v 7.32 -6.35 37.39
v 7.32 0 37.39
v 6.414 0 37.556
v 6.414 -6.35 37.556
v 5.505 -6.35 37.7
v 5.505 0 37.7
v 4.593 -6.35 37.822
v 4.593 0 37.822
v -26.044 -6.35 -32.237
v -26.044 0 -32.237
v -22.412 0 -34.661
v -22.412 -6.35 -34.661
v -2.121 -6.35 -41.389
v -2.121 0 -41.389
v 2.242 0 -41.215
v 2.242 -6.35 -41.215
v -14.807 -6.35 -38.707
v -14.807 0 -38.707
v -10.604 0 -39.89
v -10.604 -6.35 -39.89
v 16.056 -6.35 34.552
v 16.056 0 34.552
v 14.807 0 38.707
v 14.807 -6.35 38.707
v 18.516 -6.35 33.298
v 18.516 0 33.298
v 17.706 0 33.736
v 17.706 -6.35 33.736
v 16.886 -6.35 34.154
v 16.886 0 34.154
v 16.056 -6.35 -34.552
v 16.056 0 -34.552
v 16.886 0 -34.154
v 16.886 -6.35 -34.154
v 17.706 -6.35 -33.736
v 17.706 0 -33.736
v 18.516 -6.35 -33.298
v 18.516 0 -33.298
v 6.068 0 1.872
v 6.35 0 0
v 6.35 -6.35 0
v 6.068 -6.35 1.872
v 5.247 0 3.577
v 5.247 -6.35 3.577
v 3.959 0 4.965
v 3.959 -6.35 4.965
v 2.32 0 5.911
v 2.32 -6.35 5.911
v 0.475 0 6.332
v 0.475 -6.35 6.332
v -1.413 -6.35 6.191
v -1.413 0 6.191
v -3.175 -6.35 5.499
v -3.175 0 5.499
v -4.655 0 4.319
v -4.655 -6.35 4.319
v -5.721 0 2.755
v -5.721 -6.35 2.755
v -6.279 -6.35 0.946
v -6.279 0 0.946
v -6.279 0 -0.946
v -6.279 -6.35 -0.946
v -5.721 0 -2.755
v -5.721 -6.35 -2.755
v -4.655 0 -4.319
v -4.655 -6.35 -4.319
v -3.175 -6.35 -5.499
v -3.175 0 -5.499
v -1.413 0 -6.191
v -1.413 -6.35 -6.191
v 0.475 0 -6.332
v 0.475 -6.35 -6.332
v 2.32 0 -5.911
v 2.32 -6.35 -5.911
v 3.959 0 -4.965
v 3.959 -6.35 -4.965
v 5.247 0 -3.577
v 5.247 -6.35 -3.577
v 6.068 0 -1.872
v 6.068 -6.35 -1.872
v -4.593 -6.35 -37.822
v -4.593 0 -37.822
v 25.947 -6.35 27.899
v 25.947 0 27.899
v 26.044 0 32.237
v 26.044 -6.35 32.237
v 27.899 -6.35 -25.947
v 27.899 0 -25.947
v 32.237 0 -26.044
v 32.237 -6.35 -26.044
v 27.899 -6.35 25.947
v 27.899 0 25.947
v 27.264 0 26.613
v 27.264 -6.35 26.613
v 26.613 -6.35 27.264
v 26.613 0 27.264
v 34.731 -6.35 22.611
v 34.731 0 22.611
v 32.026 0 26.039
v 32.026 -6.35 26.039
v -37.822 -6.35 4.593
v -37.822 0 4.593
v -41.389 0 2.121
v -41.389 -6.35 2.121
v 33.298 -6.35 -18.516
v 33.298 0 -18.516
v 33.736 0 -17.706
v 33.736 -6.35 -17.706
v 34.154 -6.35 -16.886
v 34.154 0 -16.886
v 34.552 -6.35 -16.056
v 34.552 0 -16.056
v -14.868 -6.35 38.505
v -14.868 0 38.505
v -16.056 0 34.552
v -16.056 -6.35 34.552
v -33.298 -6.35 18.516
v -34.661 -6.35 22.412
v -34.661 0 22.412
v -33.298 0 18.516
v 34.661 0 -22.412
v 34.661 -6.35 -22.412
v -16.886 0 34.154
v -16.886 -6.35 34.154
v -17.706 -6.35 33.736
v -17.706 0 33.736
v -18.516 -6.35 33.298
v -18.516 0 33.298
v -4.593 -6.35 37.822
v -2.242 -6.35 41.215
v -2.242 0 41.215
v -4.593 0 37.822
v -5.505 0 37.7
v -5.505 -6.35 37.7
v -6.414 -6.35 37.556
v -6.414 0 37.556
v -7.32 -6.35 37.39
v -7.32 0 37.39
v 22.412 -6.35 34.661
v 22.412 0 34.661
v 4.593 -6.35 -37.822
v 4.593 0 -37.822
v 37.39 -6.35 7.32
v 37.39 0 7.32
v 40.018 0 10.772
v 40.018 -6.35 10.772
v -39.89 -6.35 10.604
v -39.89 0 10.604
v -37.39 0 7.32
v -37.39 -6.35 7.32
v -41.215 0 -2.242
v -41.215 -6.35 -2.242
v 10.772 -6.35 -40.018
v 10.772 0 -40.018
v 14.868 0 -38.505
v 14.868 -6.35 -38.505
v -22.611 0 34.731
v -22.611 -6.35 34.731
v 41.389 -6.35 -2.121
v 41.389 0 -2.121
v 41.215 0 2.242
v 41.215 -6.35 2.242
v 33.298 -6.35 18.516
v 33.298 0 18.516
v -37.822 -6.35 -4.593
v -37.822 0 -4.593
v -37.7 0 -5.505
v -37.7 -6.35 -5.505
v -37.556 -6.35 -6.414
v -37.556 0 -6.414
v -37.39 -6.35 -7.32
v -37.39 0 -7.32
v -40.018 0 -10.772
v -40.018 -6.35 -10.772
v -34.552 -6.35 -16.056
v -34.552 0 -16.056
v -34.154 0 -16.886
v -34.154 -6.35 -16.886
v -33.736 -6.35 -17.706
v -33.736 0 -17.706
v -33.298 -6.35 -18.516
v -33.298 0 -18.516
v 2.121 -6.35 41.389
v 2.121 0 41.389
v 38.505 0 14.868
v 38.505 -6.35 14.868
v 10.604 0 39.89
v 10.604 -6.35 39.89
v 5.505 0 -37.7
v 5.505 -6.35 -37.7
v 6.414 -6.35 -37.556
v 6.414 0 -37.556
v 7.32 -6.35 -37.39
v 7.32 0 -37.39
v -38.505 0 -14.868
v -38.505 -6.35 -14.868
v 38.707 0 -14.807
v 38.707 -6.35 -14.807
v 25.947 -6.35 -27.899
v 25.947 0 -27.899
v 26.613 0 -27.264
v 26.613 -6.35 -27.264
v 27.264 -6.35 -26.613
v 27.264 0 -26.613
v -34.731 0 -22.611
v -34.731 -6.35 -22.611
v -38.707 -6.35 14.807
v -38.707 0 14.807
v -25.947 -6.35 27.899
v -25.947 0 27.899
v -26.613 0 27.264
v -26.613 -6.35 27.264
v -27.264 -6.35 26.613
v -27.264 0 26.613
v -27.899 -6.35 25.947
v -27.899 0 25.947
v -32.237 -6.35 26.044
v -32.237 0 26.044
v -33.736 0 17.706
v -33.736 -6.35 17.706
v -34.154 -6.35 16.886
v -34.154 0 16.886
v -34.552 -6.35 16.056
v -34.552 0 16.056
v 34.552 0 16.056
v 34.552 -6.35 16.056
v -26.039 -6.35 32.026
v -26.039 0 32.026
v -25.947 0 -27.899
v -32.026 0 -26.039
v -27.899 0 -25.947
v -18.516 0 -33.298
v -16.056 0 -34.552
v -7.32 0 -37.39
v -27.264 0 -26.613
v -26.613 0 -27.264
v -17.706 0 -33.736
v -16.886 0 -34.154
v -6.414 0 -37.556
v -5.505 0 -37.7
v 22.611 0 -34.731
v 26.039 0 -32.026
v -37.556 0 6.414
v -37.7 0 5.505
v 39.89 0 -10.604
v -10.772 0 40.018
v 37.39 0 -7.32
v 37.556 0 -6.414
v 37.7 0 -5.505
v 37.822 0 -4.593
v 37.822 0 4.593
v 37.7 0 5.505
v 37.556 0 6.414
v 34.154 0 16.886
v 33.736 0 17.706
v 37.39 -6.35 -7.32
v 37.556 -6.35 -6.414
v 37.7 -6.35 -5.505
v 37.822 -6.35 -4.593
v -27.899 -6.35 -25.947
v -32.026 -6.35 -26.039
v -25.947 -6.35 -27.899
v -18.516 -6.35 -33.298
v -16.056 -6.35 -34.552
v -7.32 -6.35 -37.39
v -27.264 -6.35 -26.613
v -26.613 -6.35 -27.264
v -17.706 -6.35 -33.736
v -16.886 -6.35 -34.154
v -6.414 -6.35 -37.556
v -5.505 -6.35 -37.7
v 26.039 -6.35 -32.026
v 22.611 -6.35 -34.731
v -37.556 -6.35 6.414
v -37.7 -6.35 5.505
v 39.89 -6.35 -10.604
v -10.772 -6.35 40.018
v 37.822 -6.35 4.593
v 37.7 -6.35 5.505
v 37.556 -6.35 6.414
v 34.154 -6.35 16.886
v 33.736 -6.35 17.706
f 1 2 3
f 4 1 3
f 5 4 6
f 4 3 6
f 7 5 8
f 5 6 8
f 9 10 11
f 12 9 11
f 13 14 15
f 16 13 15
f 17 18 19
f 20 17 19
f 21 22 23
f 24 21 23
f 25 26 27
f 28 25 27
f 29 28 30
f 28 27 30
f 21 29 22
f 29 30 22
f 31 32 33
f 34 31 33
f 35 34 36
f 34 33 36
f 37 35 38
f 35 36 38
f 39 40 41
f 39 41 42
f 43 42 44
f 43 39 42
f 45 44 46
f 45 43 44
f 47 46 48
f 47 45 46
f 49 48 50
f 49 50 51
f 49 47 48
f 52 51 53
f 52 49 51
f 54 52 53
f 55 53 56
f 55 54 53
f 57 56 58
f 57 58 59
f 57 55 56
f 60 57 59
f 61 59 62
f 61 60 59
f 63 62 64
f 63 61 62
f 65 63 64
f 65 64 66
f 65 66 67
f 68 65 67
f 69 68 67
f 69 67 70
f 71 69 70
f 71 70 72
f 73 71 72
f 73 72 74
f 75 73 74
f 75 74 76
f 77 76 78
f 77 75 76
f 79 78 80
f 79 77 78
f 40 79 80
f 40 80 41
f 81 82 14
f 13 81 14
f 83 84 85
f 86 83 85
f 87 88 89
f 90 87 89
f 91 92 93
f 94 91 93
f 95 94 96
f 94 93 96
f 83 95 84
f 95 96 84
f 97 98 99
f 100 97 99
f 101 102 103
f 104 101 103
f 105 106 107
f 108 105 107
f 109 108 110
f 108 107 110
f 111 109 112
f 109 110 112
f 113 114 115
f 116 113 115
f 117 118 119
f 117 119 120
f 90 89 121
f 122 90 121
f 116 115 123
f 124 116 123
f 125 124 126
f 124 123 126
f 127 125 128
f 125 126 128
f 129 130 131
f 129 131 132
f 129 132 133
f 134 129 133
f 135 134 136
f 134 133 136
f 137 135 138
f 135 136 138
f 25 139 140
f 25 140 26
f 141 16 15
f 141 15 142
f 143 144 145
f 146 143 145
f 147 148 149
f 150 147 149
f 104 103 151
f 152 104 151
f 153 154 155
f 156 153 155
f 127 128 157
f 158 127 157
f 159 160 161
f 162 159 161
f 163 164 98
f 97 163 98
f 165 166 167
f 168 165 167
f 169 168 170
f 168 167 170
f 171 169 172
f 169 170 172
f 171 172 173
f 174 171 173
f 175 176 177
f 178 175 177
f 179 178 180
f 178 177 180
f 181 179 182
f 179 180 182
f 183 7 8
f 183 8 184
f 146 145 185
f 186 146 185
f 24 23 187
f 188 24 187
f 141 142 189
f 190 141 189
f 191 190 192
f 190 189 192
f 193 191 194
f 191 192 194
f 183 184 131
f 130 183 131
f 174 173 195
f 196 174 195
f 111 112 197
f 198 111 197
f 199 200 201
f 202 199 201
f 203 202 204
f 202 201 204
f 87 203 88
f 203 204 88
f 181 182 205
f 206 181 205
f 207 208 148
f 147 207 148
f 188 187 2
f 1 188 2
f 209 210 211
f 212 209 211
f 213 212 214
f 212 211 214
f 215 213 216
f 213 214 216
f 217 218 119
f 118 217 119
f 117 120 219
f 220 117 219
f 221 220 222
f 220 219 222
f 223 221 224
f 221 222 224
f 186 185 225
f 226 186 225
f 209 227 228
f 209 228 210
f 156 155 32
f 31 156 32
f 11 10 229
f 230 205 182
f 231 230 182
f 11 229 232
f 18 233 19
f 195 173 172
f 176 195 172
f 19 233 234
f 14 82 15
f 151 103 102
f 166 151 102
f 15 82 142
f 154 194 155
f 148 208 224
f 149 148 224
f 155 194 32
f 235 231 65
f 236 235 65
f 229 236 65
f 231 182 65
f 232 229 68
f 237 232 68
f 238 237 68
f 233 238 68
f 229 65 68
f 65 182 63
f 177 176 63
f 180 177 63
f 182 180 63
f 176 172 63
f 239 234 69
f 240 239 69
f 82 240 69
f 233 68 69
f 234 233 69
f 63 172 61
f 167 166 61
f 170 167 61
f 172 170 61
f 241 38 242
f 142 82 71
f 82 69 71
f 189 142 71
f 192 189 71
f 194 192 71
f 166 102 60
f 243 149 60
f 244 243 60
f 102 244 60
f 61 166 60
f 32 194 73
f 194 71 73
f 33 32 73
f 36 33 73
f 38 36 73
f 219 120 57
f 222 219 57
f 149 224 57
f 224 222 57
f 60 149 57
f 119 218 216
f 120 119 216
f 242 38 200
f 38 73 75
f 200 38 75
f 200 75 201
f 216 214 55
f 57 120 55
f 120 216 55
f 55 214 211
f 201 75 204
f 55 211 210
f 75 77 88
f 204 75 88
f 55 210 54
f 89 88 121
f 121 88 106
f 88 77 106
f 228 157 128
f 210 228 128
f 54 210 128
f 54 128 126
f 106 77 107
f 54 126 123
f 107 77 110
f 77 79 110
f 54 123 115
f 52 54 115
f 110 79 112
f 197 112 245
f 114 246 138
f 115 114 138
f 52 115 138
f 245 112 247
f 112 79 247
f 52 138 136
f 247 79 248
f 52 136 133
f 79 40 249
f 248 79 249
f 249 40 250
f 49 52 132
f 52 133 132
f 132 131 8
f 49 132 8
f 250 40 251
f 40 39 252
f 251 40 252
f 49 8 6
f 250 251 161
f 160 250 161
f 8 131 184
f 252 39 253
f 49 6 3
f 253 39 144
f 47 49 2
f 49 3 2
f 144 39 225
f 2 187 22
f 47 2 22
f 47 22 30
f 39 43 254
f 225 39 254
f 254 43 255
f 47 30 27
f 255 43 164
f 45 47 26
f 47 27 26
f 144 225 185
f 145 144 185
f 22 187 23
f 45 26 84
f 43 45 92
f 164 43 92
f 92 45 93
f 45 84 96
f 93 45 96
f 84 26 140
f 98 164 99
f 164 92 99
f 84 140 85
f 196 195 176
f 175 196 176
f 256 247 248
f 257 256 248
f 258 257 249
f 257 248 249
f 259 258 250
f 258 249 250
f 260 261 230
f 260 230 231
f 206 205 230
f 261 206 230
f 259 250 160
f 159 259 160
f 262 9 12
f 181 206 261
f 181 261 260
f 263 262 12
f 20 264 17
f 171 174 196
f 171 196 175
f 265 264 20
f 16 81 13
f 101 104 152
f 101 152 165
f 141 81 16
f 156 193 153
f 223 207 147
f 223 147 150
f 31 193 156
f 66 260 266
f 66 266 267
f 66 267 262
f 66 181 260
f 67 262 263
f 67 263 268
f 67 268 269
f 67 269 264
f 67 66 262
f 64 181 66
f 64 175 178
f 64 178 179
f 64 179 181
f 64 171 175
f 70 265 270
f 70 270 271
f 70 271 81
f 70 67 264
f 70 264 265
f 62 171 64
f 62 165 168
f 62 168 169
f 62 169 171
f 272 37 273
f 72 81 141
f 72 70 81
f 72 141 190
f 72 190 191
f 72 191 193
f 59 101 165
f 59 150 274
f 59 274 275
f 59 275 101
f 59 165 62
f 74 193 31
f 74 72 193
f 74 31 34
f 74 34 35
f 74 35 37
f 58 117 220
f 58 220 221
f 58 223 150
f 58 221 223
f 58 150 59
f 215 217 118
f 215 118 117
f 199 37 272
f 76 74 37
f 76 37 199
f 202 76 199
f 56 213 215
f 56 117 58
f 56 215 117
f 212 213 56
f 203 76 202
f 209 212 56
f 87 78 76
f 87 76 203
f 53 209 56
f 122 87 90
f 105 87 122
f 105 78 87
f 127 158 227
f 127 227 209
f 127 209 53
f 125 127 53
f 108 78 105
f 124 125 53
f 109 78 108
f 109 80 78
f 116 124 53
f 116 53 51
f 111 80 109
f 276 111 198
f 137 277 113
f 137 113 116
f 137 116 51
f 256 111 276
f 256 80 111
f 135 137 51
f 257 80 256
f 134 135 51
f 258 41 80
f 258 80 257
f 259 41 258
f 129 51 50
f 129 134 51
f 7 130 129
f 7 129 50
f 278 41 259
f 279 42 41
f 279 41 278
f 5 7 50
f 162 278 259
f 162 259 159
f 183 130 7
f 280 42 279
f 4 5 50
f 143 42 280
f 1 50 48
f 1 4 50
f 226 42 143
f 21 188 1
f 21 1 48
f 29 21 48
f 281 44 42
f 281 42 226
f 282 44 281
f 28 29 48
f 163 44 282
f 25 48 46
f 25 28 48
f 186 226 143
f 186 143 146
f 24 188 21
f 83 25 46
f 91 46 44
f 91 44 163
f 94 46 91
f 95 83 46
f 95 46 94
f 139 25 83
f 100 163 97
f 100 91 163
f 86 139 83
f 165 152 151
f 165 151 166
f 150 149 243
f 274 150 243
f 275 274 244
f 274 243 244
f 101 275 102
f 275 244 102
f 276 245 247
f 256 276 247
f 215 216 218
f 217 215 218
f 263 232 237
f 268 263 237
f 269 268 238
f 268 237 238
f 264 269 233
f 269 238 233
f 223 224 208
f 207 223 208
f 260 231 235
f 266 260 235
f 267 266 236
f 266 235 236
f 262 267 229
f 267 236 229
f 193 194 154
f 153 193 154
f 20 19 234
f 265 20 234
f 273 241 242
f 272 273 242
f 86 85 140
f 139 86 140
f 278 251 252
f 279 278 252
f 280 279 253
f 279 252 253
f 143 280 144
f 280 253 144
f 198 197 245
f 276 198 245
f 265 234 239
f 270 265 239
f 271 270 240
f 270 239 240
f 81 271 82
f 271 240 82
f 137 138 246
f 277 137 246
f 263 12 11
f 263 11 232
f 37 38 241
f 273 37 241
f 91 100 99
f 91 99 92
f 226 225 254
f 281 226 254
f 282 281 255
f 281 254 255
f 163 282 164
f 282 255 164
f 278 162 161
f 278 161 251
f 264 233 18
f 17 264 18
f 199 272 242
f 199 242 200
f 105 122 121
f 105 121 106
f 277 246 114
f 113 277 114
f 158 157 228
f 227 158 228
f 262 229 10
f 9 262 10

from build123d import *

# Parameters (mm, degrees)
F0_R     = 6.35
F1_DEPTH = 6.35


with BuildPart() as f1:
    # F0 (on Front) → F1 (new body)
    with BuildSketch(Plane.XZ):
        with BuildLine():
            Line((-2.24177, 41.214794), (-4.592605, 37.822189))
            ThreePointArc((-4.592605, 37.822189), (-5.960153, 37.630926), (-7.319872, 37.390232))
            Line((-7.319872, 37.390232), (-10.772221, 40.018387))
            Line((-10.772221, 40.018387), (-14.868121, 38.504853))
            Line((-14.868121, 38.504853), (-16.055526, 34.551846))
            ThreePointArc((-16.055526, 34.551846), (-17.297038, 33.947349), (-18.515829, 33.298259))
            Line((-18.515829, 33.298259), (-22.611352, 34.730948))
            Line((-22.611352, 34.730948), (-26.039078, 32.02579))
            Line((-26.039078, 32.02579), (-25.946821, 27.899328))
            ThreePointArc((-25.946821, 27.899328), (-26.940768, 26.940768), (-27.899328, 25.946821))
            Line((-27.899328, 25.946821), (-32.237127, 26.043803))
            Line((-32.237127, 26.043803), (-34.661148, 22.411818))
            Line((-34.661148, 22.411818), (-33.298259, 18.515829))
            ThreePointArc((-33.298259, 18.515829), (-33.947349, 17.297038), (-34.551846, 16.055526))
            Line((-34.551846, 16.055526), (-38.707307, 14.807308))
            Line((-38.707307, 14.807308), (-39.890343, 10.604022))
            Line((-39.890343, 10.604022), (-37.390232, 7.319872))
            ThreePointArc((-37.390232, 7.319872), (-37.630926, 5.960153), (-37.822189, 4.592605))
            Line((-37.822189, 4.592605), (-41.388547, 2.121371))
            Line((-41.388547, 2.121371), (-41.214794, -2.24177))
            Line((-41.214794, -2.24177), (-37.822189, -4.592605))
            ThreePointArc((-37.822189, -4.592605), (-37.630926, -5.960153), (-37.390232, -7.319872))
            Line((-37.390232, -7.319872), (-40.018387, -10.772221))
            Line((-40.018387, -10.772221), (-38.504853, -14.868121))
            Line((-38.504853, -14.868121), (-34.551846, -16.055526))
            ThreePointArc((-34.551846, -16.055526), (-33.947349, -17.297038), (-33.298259, -18.515829))
            Line((-33.298259, -18.515829), (-34.730948, -22.611352))
            Line((-34.730948, -22.611352), (-32.02579, -26.039078))
            Line((-32.02579, -26.039078), (-27.899328, -25.946821))
            ThreePointArc((-27.899328, -25.946821), (-26.940768, -26.940768), (-25.946821, -27.899328))
            Line((-25.946821, -27.899328), (-26.043803, -32.237127))
            Line((-26.043803, -32.237127), (-22.411818, -34.661148))
            Line((-22.411818, -34.661148), (-18.515829, -33.298259))
            ThreePointArc((-18.515829, -33.298259), (-17.297038, -33.947349), (-16.055526, -34.551846))
            Line((-16.055526, -34.551846), (-14.807308, -38.707307))
            Line((-14.807308, -38.707307), (-10.604022, -39.890343))
            Line((-10.604022, -39.890343), (-7.319872, -37.390232))
            ThreePointArc((-7.319872, -37.390232), (-5.960153, -37.630926), (-4.592605, -37.822189))
            Line((-4.592605, -37.822189), (-2.121371, -41.388547))
            Line((-2.121371, -41.388547), (2.24177, -41.214794))
            Line((2.24177, -41.214794), (4.592605, -37.822189))
            ThreePointArc((4.592605, -37.822189), (5.960153, -37.630926), (7.319872, -37.390232))
            Line((7.319872, -37.390232), (10.772221, -40.018387))
            Line((10.772221, -40.018387), (14.868121, -38.504853))
            Line((14.868121, -38.504853), (16.055526, -34.551846))
            ThreePointArc((16.055526, -34.551846), (17.297038, -33.947349), (18.515829, -33.298259))
            Line((18.515829, -33.298259), (22.611352, -34.730948))
            Line((22.611352, -34.730948), (26.039078, -32.02579))
            Line((26.039078, -32.02579), (25.946821, -27.899328))
            ThreePointArc((25.946821, -27.899328), (26.940768, -26.940768), (27.899328, -25.946821))
            Line((27.899328, -25.946821), (32.237127, -26.043803))
            Line((32.237127, -26.043803), (34.661148, -22.411818))
            Line((34.661148, -22.411818), (33.298259, -18.515829))
            ThreePointArc((33.298259, -18.515829), (33.947349, -17.297038), (34.551846, -16.055526))
            Line((34.551846, -16.055526), (38.707307, -14.807308))
            Line((38.707307, -14.807308), (39.890343, -10.604022))
            Line((39.890343, -10.604022), (37.390232, -7.319872))
            ThreePointArc((37.390232, -7.319872), (37.630926, -5.960153), (37.822189, -4.592605))
            Line((37.822189, -4.592605), (41.388547, -2.121371))
            Line((41.388547, -2.121371), (41.214794, 2.24177))
            Line((41.214794, 2.24177), (37.822189, 4.592605))
            ThreePointArc((37.822189, 4.592605), (37.630926, 5.960153), (37.390232, 7.319872))
            Line((37.390232, 7.319872), (40.018387, 10.772221))
            Line((40.018387, 10.772221), (38.504853, 14.868121))
            Line((38.504853, 14.868121), (34.551846, 16.055526))
            ThreePointArc((34.551846, 16.055526), (33.947349, 17.297038), (33.298259, 18.515829))
            Line((33.298259, 18.515829), (34.730948, 22.611352))
            Line((34.730948, 22.611352), (32.02579, 26.039078))
            Line((32.02579, 26.039078), (27.899328, 25.946821))
            ThreePointArc((27.899328, 25.946821), (26.940768, 26.940768), (25.946821, 27.899328))
            Line((25.946821, 27.899328), (26.043803, 32.237127))
            Line((26.043803, 32.237127), (22.411818, 34.661148))
            Line((22.411818, 34.661148), (18.515829, 33.298259))
            ThreePointArc((18.515829, 33.298259), (17.297038, 33.947349), (16.055526, 34.551846))
            Line((16.055526, 34.551846), (14.807308, 38.707307))
            Line((14.807308, 38.707307), (10.604022, 39.890343))
            Line((10.604022, 39.890343), (7.319872, 37.390232))
            ThreePointArc((7.319872, 37.390232), (5.960153, 37.630926), (4.592605, 37.822189))
            Line((4.592605, 37.822189), (2.121387, 41.388558))
            Line((2.121387, 41.388558), (-2.24177, 41.214794))
        make_face()
        Circle(F0_R, mode=Mode.SUBTRACT)
    extrude(amount=F1_DEPTH)


solid = f1.part
